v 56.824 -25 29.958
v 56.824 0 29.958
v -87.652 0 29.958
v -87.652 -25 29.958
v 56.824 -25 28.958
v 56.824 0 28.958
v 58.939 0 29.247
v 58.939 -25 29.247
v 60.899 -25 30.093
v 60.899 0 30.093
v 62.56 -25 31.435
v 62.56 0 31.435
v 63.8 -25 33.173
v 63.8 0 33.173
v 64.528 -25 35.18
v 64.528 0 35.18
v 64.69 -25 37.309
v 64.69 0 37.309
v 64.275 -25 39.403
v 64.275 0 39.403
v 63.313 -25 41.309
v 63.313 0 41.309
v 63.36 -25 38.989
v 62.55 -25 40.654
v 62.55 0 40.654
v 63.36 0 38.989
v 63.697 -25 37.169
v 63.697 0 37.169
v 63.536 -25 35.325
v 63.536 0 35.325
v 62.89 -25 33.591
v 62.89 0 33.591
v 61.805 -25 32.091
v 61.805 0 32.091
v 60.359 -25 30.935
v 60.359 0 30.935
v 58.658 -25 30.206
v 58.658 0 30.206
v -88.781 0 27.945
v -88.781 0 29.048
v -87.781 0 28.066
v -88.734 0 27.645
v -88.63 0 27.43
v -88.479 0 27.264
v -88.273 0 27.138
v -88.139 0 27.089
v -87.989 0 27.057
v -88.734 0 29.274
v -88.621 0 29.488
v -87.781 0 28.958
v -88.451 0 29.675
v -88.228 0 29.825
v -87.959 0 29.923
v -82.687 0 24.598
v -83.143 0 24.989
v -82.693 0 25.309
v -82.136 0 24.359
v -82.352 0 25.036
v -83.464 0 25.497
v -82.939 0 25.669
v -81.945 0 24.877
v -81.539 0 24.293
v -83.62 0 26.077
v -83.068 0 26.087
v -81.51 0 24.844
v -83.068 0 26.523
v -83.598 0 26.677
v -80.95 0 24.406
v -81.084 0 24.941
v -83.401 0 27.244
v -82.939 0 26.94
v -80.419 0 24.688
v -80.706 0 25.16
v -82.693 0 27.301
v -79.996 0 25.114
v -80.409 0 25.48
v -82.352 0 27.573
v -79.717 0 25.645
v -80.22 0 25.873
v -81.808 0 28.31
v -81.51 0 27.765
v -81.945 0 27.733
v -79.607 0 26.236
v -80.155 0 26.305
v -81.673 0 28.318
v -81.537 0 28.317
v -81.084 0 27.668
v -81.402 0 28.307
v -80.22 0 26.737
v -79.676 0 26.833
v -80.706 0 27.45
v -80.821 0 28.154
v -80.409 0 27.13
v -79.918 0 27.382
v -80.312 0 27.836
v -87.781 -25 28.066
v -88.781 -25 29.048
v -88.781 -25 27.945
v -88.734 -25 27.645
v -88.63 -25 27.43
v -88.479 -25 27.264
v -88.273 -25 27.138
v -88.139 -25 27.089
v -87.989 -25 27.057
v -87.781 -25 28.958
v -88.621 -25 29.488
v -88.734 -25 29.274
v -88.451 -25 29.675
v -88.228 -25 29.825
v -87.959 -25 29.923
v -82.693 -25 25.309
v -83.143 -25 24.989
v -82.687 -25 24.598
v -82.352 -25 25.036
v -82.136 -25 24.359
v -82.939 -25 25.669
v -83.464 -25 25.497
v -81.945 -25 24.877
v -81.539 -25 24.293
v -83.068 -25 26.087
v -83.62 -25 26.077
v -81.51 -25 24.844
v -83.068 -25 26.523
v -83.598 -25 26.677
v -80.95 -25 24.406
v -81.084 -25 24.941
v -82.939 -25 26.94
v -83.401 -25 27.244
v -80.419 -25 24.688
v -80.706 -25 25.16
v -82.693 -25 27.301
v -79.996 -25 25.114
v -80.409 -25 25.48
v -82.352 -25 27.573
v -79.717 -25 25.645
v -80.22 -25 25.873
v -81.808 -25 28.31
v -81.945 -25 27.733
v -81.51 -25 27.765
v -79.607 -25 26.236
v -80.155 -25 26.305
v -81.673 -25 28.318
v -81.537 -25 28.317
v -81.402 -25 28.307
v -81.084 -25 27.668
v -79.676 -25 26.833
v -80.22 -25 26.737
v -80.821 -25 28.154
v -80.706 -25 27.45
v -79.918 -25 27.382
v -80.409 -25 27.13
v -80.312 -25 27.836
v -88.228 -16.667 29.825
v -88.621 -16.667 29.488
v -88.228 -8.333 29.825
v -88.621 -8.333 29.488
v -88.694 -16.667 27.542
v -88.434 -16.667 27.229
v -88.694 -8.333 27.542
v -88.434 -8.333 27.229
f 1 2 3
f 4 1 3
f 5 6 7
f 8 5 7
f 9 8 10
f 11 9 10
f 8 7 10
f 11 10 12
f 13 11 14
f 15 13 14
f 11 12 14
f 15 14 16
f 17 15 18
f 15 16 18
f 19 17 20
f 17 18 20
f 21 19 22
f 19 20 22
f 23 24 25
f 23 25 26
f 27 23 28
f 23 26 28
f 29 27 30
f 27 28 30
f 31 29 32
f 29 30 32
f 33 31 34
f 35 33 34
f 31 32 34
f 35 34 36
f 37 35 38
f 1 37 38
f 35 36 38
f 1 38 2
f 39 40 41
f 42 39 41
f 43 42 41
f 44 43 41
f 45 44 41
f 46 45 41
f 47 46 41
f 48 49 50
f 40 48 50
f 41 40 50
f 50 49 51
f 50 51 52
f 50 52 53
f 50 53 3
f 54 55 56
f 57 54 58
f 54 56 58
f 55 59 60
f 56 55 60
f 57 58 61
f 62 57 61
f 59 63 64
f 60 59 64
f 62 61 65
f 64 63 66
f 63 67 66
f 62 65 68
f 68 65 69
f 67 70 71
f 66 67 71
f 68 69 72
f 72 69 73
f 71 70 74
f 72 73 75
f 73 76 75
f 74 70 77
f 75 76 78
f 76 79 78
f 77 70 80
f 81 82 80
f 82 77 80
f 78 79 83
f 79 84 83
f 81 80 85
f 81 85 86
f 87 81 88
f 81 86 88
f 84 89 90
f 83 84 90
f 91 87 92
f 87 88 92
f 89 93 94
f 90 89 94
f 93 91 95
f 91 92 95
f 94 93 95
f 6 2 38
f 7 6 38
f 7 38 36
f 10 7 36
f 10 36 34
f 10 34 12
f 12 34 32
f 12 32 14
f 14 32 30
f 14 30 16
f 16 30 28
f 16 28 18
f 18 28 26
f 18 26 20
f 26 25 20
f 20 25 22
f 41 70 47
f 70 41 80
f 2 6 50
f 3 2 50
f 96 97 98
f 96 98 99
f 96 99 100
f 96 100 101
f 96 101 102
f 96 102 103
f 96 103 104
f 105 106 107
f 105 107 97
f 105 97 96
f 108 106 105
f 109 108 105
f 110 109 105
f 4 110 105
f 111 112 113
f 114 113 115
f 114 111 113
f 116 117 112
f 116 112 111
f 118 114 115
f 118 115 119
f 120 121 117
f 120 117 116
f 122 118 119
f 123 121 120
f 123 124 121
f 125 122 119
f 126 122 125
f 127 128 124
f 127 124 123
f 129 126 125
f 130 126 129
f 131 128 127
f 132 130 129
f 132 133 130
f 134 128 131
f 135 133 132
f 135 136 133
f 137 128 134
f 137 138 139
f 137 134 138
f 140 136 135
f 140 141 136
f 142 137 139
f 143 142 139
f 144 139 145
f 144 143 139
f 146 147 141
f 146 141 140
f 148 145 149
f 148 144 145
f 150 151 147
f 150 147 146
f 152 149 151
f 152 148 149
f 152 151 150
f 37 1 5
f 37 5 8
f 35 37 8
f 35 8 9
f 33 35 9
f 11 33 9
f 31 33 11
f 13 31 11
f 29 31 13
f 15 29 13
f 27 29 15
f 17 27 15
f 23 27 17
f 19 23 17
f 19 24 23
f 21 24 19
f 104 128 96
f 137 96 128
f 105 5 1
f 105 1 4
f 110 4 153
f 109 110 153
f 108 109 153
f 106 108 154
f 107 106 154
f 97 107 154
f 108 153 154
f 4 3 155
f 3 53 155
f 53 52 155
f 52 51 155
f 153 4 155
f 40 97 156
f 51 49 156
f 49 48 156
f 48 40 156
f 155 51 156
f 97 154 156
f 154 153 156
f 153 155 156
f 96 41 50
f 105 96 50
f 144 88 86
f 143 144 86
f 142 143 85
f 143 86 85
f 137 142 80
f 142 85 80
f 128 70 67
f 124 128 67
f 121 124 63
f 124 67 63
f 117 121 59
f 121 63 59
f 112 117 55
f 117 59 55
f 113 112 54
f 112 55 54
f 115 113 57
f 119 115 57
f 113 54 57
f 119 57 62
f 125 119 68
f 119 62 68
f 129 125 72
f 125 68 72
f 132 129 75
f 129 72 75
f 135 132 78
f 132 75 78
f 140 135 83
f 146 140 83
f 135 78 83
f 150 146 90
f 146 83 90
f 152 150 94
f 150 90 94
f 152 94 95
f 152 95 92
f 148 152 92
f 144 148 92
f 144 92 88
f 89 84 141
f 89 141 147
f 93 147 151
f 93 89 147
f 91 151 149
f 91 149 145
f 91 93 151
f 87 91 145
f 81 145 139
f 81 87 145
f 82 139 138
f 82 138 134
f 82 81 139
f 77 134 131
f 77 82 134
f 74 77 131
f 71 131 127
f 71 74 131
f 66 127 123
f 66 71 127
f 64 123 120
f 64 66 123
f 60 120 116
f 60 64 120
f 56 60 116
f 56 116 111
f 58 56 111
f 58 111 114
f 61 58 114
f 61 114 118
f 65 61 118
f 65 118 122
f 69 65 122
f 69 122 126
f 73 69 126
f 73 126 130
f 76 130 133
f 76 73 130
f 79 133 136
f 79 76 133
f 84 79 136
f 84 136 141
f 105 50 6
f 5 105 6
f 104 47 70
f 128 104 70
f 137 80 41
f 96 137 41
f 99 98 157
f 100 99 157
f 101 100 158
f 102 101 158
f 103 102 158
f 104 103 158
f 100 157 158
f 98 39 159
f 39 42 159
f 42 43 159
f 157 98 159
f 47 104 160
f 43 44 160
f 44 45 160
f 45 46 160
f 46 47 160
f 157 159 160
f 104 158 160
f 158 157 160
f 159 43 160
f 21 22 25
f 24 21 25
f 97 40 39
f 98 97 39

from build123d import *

# Parameters (mm, degrees)
F0_R     = 1.464722
F1_DEPTH = 25


with BuildPart() as f1:
    # F0 (on Front) → F1 (new body)
    with BuildSketch(Plane.XZ):
        with BuildLine():
            Line((56.823755, 29.957542), (-87.65175, 29.957542))
            add(Edge.make_bspline(
                [(-87.65175, 29.957542), (-88.301932, 29.960531), (-88.75546, 29.505347), (-88.781094, 29.047866)],
                knots=[0, 0, 0, 0, 1.450148, 1.450148, 1.450148, 1.450148], degree=3))
            Line((-88.781094, 29.047866), (-88.781094, 27.945455))
            add(Edge.make_bspline(
                [(-88.781094, 27.945455), (-88.775299, 27.514639), (-88.530844, 27.140533), (-87.988705, 27.056743)],
                knots=[0, 0, 0, 0, 1.190668, 1.190668, 1.190668, 1.190668], degree=3))
            Line((-87.988705, 27.056743), (-83.400639, 27.243855))
            ThreePointArc((-83.400639, 27.243855), (-80.673788, 24.526915), (-81.402029, 28.306749))
            ThreePointArc((-81.402029, 28.306749), (-81.605014, 28.318455), (-81.808144, 28.309632))
            Line((-81.808144, 28.309632), (-87.781094, 28.066041))
            Line((-87.781094, 28.066041), (-87.781094, 28.957542))
            Line((-87.781094, 28.957542), (56.823755, 28.957542))
            ThreePointArc((56.823755, 28.957542), (63.800247, 33.172878), (63.313478, 41.309435))
            Line((63.313478, 41.309435), (62.549877, 40.653716))
            ThreePointArc((62.549877, 40.653716), (62.889985, 33.590834), (56.823755, 29.957542))
        make_face()
        with Locations((-81.619306, 26.304817)):
            Circle(F0_R, mode=Mode.SUBTRACT)
    extrude(amount=F1_DEPTH)


solid = f1.part
